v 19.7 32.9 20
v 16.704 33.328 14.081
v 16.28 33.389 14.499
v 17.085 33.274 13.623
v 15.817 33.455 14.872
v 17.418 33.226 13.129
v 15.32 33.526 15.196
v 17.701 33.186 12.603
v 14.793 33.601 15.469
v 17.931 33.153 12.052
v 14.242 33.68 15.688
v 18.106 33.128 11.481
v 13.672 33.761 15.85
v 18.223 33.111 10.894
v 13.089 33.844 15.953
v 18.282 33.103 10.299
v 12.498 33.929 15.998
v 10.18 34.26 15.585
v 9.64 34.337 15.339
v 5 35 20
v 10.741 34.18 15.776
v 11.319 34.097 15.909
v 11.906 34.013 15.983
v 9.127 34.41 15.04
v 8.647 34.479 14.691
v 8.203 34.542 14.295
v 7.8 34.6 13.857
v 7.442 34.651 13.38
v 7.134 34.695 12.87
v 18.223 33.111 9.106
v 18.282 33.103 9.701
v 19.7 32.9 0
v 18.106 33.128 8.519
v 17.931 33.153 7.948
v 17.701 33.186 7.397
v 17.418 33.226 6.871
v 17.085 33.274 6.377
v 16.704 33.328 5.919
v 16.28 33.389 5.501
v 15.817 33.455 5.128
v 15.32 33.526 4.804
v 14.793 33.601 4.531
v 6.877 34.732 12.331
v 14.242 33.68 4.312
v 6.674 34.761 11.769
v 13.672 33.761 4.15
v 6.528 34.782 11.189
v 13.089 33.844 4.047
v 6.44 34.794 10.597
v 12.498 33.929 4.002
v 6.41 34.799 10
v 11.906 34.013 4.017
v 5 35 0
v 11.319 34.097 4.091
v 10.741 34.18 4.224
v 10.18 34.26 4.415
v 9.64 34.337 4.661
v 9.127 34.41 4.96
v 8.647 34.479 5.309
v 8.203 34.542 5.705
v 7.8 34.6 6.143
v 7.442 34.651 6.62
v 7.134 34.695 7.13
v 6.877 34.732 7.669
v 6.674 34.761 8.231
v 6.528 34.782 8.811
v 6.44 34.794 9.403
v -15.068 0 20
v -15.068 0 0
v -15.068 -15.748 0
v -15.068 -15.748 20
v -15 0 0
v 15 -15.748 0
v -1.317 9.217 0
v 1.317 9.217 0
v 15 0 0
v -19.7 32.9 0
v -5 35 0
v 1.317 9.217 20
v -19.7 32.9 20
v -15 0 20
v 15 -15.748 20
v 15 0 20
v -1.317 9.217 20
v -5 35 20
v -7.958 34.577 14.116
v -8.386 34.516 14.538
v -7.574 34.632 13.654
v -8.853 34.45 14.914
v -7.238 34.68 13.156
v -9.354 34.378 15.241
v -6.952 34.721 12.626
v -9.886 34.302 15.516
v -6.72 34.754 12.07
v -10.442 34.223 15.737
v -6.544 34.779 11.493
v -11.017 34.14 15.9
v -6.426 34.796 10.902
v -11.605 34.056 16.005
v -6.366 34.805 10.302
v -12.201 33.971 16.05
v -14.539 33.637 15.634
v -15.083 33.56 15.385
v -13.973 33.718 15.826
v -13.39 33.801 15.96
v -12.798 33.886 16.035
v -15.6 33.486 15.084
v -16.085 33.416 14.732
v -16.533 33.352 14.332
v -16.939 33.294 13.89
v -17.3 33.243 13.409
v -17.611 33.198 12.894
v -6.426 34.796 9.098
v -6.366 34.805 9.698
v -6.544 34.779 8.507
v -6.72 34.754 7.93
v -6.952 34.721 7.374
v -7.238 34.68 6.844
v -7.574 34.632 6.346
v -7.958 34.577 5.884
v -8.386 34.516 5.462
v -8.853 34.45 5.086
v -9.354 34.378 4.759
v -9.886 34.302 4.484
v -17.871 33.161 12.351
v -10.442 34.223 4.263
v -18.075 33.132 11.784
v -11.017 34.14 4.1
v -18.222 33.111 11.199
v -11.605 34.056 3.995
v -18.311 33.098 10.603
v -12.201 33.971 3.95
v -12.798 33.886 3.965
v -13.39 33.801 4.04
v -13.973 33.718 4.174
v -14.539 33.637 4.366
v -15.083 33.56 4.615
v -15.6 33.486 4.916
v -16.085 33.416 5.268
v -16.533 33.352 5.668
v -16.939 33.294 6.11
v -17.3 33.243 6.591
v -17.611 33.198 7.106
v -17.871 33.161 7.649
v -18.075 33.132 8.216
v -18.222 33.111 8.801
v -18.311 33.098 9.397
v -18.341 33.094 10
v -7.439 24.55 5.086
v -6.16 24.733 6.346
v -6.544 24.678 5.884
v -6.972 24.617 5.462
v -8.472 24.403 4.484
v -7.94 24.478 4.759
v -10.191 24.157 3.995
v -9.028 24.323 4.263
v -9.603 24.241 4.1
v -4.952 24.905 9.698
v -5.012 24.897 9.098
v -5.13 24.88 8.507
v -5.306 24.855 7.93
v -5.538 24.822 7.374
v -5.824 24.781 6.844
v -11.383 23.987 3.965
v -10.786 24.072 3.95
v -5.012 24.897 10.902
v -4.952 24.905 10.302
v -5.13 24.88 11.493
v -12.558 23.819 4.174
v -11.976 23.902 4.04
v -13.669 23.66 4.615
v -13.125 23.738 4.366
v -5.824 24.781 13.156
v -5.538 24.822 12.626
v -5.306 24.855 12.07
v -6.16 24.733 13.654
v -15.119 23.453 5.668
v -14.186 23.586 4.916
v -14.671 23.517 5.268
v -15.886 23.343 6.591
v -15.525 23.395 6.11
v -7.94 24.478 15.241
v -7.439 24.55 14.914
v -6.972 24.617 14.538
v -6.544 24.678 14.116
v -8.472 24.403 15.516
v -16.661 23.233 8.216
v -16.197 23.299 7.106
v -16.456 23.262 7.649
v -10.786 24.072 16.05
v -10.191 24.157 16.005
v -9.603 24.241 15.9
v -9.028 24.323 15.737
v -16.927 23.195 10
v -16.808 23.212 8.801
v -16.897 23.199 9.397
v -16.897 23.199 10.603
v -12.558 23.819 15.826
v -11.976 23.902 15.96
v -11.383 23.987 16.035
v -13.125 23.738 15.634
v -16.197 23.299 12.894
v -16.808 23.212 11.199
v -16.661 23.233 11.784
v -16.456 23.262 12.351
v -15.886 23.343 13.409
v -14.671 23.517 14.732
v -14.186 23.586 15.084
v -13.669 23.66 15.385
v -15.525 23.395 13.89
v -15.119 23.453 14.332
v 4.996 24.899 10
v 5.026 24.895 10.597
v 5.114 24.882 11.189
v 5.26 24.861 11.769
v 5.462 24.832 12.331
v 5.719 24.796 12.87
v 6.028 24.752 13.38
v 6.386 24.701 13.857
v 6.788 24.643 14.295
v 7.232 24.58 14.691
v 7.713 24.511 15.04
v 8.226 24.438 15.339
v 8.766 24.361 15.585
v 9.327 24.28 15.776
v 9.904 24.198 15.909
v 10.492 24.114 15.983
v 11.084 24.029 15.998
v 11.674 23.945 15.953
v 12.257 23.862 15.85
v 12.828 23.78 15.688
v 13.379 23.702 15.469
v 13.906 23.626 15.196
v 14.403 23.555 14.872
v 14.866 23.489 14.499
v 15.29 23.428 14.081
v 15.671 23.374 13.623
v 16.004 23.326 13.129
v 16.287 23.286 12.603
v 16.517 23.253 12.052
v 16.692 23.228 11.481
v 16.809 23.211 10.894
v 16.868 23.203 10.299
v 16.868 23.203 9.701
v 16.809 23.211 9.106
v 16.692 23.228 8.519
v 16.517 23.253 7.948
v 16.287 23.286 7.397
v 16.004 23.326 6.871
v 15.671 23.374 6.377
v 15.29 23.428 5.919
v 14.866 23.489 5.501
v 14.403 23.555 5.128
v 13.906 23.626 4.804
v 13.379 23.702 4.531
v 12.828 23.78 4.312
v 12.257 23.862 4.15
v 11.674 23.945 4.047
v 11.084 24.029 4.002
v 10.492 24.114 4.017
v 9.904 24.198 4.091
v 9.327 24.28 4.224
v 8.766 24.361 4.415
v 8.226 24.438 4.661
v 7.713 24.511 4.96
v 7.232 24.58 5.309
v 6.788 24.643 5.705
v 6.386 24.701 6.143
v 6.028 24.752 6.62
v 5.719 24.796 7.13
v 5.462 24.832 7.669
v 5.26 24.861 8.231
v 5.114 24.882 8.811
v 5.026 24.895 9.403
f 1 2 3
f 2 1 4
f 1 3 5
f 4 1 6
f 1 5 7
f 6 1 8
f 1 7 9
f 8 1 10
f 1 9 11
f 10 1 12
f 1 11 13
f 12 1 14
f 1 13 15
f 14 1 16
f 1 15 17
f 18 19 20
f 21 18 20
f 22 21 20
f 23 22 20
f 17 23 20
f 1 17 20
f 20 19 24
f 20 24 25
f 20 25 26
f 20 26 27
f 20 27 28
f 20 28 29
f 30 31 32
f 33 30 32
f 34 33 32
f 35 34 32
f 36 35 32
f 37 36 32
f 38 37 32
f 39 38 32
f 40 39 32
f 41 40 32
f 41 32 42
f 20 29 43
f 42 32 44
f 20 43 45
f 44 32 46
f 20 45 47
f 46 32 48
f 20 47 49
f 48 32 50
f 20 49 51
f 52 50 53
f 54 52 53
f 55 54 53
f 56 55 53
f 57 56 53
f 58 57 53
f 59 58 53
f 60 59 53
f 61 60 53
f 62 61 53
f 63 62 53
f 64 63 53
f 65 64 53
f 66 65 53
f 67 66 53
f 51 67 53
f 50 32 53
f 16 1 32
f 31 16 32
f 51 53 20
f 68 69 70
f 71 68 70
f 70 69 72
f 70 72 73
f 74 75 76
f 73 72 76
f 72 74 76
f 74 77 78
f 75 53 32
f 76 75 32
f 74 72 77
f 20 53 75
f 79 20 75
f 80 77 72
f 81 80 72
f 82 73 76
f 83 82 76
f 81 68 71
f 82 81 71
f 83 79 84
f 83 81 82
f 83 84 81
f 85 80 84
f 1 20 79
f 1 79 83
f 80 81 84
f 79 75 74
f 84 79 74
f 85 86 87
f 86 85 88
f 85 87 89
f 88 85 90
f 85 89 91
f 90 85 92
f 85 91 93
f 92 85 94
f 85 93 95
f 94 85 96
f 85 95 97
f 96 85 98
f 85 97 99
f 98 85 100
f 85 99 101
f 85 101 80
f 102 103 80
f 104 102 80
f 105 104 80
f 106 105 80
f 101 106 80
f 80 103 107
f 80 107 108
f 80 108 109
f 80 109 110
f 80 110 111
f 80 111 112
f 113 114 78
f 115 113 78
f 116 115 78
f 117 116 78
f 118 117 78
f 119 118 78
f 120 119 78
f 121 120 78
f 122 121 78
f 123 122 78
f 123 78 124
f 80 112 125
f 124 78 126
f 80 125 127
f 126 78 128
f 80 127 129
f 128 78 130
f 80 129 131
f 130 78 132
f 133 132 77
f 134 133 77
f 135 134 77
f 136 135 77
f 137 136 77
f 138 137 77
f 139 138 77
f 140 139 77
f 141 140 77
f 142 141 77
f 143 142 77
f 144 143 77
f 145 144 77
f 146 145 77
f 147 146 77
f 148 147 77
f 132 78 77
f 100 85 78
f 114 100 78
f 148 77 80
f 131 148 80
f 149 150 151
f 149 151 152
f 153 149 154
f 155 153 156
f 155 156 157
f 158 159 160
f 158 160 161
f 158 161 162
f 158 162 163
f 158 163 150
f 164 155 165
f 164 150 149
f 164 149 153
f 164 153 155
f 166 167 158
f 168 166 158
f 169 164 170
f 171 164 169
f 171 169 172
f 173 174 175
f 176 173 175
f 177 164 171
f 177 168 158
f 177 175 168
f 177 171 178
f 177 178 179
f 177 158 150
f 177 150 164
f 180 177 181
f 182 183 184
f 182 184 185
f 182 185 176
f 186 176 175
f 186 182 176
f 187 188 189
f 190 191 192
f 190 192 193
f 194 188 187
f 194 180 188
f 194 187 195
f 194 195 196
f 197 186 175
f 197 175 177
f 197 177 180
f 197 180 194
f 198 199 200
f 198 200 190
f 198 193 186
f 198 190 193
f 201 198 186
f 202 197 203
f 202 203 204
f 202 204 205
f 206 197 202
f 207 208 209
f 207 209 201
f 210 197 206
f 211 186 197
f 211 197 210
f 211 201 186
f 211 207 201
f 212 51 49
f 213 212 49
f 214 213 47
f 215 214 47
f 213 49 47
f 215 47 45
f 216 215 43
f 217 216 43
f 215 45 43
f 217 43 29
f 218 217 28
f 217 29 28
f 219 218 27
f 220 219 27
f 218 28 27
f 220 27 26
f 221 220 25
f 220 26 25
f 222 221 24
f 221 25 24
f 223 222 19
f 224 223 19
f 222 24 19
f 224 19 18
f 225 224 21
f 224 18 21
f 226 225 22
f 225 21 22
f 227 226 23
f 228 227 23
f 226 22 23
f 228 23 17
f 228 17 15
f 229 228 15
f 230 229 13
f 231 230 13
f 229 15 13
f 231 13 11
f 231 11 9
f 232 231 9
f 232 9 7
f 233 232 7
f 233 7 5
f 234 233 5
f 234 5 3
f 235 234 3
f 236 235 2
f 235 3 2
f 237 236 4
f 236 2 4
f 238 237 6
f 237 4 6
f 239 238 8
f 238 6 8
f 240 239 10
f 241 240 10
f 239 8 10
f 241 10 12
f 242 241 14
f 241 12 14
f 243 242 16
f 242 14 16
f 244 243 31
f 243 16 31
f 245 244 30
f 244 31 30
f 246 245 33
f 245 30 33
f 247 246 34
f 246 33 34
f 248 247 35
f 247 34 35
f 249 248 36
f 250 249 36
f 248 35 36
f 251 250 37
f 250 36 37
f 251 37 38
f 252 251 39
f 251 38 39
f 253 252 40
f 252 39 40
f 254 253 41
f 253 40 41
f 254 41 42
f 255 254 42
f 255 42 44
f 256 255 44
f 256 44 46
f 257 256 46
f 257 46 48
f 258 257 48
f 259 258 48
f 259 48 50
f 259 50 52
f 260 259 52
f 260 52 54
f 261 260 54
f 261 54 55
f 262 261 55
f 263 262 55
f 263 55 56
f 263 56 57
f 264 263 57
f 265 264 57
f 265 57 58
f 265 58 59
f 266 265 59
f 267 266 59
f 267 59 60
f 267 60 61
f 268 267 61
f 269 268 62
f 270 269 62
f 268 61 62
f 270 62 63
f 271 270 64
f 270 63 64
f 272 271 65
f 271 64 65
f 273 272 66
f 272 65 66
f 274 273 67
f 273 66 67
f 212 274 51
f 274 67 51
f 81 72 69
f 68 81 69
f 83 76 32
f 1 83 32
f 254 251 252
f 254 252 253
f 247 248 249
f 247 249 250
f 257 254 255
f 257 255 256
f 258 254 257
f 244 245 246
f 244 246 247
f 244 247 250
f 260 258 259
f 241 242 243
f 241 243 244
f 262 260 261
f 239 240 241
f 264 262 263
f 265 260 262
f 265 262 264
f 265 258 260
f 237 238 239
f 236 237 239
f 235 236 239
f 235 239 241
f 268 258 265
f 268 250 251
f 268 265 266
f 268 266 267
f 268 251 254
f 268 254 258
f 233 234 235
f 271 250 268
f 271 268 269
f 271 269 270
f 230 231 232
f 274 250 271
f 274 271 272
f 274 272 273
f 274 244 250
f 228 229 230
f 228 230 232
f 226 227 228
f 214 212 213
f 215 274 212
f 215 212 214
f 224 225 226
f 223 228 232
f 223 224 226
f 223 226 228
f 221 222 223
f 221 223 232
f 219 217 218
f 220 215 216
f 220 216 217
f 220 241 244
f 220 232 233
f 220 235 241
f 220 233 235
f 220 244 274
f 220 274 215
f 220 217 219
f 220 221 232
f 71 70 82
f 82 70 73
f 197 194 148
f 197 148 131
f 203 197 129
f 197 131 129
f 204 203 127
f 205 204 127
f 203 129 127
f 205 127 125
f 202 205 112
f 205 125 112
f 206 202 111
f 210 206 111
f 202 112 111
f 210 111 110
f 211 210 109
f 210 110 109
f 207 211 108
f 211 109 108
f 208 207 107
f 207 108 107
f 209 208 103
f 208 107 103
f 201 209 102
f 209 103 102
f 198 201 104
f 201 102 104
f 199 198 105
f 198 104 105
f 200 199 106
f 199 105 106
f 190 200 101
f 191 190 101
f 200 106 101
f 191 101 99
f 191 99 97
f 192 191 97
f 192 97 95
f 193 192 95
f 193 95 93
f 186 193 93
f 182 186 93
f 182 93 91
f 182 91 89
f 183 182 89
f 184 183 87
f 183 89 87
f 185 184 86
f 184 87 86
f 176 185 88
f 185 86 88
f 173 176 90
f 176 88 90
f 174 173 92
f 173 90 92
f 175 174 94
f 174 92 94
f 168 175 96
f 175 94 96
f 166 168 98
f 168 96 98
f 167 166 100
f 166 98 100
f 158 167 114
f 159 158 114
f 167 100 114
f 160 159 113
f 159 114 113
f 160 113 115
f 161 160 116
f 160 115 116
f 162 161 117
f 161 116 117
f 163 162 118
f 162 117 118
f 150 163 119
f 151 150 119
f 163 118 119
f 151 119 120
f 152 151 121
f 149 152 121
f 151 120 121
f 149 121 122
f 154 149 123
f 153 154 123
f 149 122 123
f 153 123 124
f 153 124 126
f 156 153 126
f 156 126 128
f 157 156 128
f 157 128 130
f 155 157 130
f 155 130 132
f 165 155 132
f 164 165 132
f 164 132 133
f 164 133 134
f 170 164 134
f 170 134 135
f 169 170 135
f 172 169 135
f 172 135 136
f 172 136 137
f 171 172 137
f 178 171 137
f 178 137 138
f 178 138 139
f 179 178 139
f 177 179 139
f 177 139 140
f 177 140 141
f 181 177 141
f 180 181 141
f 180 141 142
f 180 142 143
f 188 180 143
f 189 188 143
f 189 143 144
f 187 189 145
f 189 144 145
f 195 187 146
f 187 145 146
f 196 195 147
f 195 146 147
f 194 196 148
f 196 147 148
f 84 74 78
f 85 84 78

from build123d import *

# Parameters (mm, degrees)
F1_DEPTH = 20
F2_R     = 6.0518975937
F3_DEPTH = 10
F4_R     = 6
F5_DEPTH = 10


with BuildPart() as f1:
    # F0 (on Top) → F1 (new body)
    with BuildSketch(Plane.XY):
        Polygon((-5, 35), (-19.7, 32.9), (-15, 0), (-15.0675689802, 0), (-15.0675689802, -15.7475546002), (15, -15.7475546002), (15, 0), (19.7, 32.9), (5, 35), (1.3167639755, 9.2173478283), (-1.3167639755, 9.2173478283), align=None)
    extrude(amount=F1_DEPTH)

    # F2 (on face) → F3 (cut)
    with BuildSketch(Plane(origin=(-5, 35, 0), x_dir=(-0.9899494937, -0.1414213562, 0), z_dir=(-0.1414213562, 0.9899494937, 0))):
        with Locations((7.4246212025, 10)):
            Circle(F2_R)
    extrude(amount=-F3_DEPTH, mode=Mode.SUBTRACT)

    # F4 (on face) → F5 (cut)
    with BuildSketch(Plane(origin=(5, 35, 0), x_dir=(-0.9899494937, 0.1414213562, 0), z_dir=(0.1414213562, 0.9899494937, 0))):
        with Locations((-7.4246212025, 10)):
            Circle(F4_R)
    extrude(amount=-F5_DEPTH, mode=Mode.SUBTRACT)


solid = f1.part
